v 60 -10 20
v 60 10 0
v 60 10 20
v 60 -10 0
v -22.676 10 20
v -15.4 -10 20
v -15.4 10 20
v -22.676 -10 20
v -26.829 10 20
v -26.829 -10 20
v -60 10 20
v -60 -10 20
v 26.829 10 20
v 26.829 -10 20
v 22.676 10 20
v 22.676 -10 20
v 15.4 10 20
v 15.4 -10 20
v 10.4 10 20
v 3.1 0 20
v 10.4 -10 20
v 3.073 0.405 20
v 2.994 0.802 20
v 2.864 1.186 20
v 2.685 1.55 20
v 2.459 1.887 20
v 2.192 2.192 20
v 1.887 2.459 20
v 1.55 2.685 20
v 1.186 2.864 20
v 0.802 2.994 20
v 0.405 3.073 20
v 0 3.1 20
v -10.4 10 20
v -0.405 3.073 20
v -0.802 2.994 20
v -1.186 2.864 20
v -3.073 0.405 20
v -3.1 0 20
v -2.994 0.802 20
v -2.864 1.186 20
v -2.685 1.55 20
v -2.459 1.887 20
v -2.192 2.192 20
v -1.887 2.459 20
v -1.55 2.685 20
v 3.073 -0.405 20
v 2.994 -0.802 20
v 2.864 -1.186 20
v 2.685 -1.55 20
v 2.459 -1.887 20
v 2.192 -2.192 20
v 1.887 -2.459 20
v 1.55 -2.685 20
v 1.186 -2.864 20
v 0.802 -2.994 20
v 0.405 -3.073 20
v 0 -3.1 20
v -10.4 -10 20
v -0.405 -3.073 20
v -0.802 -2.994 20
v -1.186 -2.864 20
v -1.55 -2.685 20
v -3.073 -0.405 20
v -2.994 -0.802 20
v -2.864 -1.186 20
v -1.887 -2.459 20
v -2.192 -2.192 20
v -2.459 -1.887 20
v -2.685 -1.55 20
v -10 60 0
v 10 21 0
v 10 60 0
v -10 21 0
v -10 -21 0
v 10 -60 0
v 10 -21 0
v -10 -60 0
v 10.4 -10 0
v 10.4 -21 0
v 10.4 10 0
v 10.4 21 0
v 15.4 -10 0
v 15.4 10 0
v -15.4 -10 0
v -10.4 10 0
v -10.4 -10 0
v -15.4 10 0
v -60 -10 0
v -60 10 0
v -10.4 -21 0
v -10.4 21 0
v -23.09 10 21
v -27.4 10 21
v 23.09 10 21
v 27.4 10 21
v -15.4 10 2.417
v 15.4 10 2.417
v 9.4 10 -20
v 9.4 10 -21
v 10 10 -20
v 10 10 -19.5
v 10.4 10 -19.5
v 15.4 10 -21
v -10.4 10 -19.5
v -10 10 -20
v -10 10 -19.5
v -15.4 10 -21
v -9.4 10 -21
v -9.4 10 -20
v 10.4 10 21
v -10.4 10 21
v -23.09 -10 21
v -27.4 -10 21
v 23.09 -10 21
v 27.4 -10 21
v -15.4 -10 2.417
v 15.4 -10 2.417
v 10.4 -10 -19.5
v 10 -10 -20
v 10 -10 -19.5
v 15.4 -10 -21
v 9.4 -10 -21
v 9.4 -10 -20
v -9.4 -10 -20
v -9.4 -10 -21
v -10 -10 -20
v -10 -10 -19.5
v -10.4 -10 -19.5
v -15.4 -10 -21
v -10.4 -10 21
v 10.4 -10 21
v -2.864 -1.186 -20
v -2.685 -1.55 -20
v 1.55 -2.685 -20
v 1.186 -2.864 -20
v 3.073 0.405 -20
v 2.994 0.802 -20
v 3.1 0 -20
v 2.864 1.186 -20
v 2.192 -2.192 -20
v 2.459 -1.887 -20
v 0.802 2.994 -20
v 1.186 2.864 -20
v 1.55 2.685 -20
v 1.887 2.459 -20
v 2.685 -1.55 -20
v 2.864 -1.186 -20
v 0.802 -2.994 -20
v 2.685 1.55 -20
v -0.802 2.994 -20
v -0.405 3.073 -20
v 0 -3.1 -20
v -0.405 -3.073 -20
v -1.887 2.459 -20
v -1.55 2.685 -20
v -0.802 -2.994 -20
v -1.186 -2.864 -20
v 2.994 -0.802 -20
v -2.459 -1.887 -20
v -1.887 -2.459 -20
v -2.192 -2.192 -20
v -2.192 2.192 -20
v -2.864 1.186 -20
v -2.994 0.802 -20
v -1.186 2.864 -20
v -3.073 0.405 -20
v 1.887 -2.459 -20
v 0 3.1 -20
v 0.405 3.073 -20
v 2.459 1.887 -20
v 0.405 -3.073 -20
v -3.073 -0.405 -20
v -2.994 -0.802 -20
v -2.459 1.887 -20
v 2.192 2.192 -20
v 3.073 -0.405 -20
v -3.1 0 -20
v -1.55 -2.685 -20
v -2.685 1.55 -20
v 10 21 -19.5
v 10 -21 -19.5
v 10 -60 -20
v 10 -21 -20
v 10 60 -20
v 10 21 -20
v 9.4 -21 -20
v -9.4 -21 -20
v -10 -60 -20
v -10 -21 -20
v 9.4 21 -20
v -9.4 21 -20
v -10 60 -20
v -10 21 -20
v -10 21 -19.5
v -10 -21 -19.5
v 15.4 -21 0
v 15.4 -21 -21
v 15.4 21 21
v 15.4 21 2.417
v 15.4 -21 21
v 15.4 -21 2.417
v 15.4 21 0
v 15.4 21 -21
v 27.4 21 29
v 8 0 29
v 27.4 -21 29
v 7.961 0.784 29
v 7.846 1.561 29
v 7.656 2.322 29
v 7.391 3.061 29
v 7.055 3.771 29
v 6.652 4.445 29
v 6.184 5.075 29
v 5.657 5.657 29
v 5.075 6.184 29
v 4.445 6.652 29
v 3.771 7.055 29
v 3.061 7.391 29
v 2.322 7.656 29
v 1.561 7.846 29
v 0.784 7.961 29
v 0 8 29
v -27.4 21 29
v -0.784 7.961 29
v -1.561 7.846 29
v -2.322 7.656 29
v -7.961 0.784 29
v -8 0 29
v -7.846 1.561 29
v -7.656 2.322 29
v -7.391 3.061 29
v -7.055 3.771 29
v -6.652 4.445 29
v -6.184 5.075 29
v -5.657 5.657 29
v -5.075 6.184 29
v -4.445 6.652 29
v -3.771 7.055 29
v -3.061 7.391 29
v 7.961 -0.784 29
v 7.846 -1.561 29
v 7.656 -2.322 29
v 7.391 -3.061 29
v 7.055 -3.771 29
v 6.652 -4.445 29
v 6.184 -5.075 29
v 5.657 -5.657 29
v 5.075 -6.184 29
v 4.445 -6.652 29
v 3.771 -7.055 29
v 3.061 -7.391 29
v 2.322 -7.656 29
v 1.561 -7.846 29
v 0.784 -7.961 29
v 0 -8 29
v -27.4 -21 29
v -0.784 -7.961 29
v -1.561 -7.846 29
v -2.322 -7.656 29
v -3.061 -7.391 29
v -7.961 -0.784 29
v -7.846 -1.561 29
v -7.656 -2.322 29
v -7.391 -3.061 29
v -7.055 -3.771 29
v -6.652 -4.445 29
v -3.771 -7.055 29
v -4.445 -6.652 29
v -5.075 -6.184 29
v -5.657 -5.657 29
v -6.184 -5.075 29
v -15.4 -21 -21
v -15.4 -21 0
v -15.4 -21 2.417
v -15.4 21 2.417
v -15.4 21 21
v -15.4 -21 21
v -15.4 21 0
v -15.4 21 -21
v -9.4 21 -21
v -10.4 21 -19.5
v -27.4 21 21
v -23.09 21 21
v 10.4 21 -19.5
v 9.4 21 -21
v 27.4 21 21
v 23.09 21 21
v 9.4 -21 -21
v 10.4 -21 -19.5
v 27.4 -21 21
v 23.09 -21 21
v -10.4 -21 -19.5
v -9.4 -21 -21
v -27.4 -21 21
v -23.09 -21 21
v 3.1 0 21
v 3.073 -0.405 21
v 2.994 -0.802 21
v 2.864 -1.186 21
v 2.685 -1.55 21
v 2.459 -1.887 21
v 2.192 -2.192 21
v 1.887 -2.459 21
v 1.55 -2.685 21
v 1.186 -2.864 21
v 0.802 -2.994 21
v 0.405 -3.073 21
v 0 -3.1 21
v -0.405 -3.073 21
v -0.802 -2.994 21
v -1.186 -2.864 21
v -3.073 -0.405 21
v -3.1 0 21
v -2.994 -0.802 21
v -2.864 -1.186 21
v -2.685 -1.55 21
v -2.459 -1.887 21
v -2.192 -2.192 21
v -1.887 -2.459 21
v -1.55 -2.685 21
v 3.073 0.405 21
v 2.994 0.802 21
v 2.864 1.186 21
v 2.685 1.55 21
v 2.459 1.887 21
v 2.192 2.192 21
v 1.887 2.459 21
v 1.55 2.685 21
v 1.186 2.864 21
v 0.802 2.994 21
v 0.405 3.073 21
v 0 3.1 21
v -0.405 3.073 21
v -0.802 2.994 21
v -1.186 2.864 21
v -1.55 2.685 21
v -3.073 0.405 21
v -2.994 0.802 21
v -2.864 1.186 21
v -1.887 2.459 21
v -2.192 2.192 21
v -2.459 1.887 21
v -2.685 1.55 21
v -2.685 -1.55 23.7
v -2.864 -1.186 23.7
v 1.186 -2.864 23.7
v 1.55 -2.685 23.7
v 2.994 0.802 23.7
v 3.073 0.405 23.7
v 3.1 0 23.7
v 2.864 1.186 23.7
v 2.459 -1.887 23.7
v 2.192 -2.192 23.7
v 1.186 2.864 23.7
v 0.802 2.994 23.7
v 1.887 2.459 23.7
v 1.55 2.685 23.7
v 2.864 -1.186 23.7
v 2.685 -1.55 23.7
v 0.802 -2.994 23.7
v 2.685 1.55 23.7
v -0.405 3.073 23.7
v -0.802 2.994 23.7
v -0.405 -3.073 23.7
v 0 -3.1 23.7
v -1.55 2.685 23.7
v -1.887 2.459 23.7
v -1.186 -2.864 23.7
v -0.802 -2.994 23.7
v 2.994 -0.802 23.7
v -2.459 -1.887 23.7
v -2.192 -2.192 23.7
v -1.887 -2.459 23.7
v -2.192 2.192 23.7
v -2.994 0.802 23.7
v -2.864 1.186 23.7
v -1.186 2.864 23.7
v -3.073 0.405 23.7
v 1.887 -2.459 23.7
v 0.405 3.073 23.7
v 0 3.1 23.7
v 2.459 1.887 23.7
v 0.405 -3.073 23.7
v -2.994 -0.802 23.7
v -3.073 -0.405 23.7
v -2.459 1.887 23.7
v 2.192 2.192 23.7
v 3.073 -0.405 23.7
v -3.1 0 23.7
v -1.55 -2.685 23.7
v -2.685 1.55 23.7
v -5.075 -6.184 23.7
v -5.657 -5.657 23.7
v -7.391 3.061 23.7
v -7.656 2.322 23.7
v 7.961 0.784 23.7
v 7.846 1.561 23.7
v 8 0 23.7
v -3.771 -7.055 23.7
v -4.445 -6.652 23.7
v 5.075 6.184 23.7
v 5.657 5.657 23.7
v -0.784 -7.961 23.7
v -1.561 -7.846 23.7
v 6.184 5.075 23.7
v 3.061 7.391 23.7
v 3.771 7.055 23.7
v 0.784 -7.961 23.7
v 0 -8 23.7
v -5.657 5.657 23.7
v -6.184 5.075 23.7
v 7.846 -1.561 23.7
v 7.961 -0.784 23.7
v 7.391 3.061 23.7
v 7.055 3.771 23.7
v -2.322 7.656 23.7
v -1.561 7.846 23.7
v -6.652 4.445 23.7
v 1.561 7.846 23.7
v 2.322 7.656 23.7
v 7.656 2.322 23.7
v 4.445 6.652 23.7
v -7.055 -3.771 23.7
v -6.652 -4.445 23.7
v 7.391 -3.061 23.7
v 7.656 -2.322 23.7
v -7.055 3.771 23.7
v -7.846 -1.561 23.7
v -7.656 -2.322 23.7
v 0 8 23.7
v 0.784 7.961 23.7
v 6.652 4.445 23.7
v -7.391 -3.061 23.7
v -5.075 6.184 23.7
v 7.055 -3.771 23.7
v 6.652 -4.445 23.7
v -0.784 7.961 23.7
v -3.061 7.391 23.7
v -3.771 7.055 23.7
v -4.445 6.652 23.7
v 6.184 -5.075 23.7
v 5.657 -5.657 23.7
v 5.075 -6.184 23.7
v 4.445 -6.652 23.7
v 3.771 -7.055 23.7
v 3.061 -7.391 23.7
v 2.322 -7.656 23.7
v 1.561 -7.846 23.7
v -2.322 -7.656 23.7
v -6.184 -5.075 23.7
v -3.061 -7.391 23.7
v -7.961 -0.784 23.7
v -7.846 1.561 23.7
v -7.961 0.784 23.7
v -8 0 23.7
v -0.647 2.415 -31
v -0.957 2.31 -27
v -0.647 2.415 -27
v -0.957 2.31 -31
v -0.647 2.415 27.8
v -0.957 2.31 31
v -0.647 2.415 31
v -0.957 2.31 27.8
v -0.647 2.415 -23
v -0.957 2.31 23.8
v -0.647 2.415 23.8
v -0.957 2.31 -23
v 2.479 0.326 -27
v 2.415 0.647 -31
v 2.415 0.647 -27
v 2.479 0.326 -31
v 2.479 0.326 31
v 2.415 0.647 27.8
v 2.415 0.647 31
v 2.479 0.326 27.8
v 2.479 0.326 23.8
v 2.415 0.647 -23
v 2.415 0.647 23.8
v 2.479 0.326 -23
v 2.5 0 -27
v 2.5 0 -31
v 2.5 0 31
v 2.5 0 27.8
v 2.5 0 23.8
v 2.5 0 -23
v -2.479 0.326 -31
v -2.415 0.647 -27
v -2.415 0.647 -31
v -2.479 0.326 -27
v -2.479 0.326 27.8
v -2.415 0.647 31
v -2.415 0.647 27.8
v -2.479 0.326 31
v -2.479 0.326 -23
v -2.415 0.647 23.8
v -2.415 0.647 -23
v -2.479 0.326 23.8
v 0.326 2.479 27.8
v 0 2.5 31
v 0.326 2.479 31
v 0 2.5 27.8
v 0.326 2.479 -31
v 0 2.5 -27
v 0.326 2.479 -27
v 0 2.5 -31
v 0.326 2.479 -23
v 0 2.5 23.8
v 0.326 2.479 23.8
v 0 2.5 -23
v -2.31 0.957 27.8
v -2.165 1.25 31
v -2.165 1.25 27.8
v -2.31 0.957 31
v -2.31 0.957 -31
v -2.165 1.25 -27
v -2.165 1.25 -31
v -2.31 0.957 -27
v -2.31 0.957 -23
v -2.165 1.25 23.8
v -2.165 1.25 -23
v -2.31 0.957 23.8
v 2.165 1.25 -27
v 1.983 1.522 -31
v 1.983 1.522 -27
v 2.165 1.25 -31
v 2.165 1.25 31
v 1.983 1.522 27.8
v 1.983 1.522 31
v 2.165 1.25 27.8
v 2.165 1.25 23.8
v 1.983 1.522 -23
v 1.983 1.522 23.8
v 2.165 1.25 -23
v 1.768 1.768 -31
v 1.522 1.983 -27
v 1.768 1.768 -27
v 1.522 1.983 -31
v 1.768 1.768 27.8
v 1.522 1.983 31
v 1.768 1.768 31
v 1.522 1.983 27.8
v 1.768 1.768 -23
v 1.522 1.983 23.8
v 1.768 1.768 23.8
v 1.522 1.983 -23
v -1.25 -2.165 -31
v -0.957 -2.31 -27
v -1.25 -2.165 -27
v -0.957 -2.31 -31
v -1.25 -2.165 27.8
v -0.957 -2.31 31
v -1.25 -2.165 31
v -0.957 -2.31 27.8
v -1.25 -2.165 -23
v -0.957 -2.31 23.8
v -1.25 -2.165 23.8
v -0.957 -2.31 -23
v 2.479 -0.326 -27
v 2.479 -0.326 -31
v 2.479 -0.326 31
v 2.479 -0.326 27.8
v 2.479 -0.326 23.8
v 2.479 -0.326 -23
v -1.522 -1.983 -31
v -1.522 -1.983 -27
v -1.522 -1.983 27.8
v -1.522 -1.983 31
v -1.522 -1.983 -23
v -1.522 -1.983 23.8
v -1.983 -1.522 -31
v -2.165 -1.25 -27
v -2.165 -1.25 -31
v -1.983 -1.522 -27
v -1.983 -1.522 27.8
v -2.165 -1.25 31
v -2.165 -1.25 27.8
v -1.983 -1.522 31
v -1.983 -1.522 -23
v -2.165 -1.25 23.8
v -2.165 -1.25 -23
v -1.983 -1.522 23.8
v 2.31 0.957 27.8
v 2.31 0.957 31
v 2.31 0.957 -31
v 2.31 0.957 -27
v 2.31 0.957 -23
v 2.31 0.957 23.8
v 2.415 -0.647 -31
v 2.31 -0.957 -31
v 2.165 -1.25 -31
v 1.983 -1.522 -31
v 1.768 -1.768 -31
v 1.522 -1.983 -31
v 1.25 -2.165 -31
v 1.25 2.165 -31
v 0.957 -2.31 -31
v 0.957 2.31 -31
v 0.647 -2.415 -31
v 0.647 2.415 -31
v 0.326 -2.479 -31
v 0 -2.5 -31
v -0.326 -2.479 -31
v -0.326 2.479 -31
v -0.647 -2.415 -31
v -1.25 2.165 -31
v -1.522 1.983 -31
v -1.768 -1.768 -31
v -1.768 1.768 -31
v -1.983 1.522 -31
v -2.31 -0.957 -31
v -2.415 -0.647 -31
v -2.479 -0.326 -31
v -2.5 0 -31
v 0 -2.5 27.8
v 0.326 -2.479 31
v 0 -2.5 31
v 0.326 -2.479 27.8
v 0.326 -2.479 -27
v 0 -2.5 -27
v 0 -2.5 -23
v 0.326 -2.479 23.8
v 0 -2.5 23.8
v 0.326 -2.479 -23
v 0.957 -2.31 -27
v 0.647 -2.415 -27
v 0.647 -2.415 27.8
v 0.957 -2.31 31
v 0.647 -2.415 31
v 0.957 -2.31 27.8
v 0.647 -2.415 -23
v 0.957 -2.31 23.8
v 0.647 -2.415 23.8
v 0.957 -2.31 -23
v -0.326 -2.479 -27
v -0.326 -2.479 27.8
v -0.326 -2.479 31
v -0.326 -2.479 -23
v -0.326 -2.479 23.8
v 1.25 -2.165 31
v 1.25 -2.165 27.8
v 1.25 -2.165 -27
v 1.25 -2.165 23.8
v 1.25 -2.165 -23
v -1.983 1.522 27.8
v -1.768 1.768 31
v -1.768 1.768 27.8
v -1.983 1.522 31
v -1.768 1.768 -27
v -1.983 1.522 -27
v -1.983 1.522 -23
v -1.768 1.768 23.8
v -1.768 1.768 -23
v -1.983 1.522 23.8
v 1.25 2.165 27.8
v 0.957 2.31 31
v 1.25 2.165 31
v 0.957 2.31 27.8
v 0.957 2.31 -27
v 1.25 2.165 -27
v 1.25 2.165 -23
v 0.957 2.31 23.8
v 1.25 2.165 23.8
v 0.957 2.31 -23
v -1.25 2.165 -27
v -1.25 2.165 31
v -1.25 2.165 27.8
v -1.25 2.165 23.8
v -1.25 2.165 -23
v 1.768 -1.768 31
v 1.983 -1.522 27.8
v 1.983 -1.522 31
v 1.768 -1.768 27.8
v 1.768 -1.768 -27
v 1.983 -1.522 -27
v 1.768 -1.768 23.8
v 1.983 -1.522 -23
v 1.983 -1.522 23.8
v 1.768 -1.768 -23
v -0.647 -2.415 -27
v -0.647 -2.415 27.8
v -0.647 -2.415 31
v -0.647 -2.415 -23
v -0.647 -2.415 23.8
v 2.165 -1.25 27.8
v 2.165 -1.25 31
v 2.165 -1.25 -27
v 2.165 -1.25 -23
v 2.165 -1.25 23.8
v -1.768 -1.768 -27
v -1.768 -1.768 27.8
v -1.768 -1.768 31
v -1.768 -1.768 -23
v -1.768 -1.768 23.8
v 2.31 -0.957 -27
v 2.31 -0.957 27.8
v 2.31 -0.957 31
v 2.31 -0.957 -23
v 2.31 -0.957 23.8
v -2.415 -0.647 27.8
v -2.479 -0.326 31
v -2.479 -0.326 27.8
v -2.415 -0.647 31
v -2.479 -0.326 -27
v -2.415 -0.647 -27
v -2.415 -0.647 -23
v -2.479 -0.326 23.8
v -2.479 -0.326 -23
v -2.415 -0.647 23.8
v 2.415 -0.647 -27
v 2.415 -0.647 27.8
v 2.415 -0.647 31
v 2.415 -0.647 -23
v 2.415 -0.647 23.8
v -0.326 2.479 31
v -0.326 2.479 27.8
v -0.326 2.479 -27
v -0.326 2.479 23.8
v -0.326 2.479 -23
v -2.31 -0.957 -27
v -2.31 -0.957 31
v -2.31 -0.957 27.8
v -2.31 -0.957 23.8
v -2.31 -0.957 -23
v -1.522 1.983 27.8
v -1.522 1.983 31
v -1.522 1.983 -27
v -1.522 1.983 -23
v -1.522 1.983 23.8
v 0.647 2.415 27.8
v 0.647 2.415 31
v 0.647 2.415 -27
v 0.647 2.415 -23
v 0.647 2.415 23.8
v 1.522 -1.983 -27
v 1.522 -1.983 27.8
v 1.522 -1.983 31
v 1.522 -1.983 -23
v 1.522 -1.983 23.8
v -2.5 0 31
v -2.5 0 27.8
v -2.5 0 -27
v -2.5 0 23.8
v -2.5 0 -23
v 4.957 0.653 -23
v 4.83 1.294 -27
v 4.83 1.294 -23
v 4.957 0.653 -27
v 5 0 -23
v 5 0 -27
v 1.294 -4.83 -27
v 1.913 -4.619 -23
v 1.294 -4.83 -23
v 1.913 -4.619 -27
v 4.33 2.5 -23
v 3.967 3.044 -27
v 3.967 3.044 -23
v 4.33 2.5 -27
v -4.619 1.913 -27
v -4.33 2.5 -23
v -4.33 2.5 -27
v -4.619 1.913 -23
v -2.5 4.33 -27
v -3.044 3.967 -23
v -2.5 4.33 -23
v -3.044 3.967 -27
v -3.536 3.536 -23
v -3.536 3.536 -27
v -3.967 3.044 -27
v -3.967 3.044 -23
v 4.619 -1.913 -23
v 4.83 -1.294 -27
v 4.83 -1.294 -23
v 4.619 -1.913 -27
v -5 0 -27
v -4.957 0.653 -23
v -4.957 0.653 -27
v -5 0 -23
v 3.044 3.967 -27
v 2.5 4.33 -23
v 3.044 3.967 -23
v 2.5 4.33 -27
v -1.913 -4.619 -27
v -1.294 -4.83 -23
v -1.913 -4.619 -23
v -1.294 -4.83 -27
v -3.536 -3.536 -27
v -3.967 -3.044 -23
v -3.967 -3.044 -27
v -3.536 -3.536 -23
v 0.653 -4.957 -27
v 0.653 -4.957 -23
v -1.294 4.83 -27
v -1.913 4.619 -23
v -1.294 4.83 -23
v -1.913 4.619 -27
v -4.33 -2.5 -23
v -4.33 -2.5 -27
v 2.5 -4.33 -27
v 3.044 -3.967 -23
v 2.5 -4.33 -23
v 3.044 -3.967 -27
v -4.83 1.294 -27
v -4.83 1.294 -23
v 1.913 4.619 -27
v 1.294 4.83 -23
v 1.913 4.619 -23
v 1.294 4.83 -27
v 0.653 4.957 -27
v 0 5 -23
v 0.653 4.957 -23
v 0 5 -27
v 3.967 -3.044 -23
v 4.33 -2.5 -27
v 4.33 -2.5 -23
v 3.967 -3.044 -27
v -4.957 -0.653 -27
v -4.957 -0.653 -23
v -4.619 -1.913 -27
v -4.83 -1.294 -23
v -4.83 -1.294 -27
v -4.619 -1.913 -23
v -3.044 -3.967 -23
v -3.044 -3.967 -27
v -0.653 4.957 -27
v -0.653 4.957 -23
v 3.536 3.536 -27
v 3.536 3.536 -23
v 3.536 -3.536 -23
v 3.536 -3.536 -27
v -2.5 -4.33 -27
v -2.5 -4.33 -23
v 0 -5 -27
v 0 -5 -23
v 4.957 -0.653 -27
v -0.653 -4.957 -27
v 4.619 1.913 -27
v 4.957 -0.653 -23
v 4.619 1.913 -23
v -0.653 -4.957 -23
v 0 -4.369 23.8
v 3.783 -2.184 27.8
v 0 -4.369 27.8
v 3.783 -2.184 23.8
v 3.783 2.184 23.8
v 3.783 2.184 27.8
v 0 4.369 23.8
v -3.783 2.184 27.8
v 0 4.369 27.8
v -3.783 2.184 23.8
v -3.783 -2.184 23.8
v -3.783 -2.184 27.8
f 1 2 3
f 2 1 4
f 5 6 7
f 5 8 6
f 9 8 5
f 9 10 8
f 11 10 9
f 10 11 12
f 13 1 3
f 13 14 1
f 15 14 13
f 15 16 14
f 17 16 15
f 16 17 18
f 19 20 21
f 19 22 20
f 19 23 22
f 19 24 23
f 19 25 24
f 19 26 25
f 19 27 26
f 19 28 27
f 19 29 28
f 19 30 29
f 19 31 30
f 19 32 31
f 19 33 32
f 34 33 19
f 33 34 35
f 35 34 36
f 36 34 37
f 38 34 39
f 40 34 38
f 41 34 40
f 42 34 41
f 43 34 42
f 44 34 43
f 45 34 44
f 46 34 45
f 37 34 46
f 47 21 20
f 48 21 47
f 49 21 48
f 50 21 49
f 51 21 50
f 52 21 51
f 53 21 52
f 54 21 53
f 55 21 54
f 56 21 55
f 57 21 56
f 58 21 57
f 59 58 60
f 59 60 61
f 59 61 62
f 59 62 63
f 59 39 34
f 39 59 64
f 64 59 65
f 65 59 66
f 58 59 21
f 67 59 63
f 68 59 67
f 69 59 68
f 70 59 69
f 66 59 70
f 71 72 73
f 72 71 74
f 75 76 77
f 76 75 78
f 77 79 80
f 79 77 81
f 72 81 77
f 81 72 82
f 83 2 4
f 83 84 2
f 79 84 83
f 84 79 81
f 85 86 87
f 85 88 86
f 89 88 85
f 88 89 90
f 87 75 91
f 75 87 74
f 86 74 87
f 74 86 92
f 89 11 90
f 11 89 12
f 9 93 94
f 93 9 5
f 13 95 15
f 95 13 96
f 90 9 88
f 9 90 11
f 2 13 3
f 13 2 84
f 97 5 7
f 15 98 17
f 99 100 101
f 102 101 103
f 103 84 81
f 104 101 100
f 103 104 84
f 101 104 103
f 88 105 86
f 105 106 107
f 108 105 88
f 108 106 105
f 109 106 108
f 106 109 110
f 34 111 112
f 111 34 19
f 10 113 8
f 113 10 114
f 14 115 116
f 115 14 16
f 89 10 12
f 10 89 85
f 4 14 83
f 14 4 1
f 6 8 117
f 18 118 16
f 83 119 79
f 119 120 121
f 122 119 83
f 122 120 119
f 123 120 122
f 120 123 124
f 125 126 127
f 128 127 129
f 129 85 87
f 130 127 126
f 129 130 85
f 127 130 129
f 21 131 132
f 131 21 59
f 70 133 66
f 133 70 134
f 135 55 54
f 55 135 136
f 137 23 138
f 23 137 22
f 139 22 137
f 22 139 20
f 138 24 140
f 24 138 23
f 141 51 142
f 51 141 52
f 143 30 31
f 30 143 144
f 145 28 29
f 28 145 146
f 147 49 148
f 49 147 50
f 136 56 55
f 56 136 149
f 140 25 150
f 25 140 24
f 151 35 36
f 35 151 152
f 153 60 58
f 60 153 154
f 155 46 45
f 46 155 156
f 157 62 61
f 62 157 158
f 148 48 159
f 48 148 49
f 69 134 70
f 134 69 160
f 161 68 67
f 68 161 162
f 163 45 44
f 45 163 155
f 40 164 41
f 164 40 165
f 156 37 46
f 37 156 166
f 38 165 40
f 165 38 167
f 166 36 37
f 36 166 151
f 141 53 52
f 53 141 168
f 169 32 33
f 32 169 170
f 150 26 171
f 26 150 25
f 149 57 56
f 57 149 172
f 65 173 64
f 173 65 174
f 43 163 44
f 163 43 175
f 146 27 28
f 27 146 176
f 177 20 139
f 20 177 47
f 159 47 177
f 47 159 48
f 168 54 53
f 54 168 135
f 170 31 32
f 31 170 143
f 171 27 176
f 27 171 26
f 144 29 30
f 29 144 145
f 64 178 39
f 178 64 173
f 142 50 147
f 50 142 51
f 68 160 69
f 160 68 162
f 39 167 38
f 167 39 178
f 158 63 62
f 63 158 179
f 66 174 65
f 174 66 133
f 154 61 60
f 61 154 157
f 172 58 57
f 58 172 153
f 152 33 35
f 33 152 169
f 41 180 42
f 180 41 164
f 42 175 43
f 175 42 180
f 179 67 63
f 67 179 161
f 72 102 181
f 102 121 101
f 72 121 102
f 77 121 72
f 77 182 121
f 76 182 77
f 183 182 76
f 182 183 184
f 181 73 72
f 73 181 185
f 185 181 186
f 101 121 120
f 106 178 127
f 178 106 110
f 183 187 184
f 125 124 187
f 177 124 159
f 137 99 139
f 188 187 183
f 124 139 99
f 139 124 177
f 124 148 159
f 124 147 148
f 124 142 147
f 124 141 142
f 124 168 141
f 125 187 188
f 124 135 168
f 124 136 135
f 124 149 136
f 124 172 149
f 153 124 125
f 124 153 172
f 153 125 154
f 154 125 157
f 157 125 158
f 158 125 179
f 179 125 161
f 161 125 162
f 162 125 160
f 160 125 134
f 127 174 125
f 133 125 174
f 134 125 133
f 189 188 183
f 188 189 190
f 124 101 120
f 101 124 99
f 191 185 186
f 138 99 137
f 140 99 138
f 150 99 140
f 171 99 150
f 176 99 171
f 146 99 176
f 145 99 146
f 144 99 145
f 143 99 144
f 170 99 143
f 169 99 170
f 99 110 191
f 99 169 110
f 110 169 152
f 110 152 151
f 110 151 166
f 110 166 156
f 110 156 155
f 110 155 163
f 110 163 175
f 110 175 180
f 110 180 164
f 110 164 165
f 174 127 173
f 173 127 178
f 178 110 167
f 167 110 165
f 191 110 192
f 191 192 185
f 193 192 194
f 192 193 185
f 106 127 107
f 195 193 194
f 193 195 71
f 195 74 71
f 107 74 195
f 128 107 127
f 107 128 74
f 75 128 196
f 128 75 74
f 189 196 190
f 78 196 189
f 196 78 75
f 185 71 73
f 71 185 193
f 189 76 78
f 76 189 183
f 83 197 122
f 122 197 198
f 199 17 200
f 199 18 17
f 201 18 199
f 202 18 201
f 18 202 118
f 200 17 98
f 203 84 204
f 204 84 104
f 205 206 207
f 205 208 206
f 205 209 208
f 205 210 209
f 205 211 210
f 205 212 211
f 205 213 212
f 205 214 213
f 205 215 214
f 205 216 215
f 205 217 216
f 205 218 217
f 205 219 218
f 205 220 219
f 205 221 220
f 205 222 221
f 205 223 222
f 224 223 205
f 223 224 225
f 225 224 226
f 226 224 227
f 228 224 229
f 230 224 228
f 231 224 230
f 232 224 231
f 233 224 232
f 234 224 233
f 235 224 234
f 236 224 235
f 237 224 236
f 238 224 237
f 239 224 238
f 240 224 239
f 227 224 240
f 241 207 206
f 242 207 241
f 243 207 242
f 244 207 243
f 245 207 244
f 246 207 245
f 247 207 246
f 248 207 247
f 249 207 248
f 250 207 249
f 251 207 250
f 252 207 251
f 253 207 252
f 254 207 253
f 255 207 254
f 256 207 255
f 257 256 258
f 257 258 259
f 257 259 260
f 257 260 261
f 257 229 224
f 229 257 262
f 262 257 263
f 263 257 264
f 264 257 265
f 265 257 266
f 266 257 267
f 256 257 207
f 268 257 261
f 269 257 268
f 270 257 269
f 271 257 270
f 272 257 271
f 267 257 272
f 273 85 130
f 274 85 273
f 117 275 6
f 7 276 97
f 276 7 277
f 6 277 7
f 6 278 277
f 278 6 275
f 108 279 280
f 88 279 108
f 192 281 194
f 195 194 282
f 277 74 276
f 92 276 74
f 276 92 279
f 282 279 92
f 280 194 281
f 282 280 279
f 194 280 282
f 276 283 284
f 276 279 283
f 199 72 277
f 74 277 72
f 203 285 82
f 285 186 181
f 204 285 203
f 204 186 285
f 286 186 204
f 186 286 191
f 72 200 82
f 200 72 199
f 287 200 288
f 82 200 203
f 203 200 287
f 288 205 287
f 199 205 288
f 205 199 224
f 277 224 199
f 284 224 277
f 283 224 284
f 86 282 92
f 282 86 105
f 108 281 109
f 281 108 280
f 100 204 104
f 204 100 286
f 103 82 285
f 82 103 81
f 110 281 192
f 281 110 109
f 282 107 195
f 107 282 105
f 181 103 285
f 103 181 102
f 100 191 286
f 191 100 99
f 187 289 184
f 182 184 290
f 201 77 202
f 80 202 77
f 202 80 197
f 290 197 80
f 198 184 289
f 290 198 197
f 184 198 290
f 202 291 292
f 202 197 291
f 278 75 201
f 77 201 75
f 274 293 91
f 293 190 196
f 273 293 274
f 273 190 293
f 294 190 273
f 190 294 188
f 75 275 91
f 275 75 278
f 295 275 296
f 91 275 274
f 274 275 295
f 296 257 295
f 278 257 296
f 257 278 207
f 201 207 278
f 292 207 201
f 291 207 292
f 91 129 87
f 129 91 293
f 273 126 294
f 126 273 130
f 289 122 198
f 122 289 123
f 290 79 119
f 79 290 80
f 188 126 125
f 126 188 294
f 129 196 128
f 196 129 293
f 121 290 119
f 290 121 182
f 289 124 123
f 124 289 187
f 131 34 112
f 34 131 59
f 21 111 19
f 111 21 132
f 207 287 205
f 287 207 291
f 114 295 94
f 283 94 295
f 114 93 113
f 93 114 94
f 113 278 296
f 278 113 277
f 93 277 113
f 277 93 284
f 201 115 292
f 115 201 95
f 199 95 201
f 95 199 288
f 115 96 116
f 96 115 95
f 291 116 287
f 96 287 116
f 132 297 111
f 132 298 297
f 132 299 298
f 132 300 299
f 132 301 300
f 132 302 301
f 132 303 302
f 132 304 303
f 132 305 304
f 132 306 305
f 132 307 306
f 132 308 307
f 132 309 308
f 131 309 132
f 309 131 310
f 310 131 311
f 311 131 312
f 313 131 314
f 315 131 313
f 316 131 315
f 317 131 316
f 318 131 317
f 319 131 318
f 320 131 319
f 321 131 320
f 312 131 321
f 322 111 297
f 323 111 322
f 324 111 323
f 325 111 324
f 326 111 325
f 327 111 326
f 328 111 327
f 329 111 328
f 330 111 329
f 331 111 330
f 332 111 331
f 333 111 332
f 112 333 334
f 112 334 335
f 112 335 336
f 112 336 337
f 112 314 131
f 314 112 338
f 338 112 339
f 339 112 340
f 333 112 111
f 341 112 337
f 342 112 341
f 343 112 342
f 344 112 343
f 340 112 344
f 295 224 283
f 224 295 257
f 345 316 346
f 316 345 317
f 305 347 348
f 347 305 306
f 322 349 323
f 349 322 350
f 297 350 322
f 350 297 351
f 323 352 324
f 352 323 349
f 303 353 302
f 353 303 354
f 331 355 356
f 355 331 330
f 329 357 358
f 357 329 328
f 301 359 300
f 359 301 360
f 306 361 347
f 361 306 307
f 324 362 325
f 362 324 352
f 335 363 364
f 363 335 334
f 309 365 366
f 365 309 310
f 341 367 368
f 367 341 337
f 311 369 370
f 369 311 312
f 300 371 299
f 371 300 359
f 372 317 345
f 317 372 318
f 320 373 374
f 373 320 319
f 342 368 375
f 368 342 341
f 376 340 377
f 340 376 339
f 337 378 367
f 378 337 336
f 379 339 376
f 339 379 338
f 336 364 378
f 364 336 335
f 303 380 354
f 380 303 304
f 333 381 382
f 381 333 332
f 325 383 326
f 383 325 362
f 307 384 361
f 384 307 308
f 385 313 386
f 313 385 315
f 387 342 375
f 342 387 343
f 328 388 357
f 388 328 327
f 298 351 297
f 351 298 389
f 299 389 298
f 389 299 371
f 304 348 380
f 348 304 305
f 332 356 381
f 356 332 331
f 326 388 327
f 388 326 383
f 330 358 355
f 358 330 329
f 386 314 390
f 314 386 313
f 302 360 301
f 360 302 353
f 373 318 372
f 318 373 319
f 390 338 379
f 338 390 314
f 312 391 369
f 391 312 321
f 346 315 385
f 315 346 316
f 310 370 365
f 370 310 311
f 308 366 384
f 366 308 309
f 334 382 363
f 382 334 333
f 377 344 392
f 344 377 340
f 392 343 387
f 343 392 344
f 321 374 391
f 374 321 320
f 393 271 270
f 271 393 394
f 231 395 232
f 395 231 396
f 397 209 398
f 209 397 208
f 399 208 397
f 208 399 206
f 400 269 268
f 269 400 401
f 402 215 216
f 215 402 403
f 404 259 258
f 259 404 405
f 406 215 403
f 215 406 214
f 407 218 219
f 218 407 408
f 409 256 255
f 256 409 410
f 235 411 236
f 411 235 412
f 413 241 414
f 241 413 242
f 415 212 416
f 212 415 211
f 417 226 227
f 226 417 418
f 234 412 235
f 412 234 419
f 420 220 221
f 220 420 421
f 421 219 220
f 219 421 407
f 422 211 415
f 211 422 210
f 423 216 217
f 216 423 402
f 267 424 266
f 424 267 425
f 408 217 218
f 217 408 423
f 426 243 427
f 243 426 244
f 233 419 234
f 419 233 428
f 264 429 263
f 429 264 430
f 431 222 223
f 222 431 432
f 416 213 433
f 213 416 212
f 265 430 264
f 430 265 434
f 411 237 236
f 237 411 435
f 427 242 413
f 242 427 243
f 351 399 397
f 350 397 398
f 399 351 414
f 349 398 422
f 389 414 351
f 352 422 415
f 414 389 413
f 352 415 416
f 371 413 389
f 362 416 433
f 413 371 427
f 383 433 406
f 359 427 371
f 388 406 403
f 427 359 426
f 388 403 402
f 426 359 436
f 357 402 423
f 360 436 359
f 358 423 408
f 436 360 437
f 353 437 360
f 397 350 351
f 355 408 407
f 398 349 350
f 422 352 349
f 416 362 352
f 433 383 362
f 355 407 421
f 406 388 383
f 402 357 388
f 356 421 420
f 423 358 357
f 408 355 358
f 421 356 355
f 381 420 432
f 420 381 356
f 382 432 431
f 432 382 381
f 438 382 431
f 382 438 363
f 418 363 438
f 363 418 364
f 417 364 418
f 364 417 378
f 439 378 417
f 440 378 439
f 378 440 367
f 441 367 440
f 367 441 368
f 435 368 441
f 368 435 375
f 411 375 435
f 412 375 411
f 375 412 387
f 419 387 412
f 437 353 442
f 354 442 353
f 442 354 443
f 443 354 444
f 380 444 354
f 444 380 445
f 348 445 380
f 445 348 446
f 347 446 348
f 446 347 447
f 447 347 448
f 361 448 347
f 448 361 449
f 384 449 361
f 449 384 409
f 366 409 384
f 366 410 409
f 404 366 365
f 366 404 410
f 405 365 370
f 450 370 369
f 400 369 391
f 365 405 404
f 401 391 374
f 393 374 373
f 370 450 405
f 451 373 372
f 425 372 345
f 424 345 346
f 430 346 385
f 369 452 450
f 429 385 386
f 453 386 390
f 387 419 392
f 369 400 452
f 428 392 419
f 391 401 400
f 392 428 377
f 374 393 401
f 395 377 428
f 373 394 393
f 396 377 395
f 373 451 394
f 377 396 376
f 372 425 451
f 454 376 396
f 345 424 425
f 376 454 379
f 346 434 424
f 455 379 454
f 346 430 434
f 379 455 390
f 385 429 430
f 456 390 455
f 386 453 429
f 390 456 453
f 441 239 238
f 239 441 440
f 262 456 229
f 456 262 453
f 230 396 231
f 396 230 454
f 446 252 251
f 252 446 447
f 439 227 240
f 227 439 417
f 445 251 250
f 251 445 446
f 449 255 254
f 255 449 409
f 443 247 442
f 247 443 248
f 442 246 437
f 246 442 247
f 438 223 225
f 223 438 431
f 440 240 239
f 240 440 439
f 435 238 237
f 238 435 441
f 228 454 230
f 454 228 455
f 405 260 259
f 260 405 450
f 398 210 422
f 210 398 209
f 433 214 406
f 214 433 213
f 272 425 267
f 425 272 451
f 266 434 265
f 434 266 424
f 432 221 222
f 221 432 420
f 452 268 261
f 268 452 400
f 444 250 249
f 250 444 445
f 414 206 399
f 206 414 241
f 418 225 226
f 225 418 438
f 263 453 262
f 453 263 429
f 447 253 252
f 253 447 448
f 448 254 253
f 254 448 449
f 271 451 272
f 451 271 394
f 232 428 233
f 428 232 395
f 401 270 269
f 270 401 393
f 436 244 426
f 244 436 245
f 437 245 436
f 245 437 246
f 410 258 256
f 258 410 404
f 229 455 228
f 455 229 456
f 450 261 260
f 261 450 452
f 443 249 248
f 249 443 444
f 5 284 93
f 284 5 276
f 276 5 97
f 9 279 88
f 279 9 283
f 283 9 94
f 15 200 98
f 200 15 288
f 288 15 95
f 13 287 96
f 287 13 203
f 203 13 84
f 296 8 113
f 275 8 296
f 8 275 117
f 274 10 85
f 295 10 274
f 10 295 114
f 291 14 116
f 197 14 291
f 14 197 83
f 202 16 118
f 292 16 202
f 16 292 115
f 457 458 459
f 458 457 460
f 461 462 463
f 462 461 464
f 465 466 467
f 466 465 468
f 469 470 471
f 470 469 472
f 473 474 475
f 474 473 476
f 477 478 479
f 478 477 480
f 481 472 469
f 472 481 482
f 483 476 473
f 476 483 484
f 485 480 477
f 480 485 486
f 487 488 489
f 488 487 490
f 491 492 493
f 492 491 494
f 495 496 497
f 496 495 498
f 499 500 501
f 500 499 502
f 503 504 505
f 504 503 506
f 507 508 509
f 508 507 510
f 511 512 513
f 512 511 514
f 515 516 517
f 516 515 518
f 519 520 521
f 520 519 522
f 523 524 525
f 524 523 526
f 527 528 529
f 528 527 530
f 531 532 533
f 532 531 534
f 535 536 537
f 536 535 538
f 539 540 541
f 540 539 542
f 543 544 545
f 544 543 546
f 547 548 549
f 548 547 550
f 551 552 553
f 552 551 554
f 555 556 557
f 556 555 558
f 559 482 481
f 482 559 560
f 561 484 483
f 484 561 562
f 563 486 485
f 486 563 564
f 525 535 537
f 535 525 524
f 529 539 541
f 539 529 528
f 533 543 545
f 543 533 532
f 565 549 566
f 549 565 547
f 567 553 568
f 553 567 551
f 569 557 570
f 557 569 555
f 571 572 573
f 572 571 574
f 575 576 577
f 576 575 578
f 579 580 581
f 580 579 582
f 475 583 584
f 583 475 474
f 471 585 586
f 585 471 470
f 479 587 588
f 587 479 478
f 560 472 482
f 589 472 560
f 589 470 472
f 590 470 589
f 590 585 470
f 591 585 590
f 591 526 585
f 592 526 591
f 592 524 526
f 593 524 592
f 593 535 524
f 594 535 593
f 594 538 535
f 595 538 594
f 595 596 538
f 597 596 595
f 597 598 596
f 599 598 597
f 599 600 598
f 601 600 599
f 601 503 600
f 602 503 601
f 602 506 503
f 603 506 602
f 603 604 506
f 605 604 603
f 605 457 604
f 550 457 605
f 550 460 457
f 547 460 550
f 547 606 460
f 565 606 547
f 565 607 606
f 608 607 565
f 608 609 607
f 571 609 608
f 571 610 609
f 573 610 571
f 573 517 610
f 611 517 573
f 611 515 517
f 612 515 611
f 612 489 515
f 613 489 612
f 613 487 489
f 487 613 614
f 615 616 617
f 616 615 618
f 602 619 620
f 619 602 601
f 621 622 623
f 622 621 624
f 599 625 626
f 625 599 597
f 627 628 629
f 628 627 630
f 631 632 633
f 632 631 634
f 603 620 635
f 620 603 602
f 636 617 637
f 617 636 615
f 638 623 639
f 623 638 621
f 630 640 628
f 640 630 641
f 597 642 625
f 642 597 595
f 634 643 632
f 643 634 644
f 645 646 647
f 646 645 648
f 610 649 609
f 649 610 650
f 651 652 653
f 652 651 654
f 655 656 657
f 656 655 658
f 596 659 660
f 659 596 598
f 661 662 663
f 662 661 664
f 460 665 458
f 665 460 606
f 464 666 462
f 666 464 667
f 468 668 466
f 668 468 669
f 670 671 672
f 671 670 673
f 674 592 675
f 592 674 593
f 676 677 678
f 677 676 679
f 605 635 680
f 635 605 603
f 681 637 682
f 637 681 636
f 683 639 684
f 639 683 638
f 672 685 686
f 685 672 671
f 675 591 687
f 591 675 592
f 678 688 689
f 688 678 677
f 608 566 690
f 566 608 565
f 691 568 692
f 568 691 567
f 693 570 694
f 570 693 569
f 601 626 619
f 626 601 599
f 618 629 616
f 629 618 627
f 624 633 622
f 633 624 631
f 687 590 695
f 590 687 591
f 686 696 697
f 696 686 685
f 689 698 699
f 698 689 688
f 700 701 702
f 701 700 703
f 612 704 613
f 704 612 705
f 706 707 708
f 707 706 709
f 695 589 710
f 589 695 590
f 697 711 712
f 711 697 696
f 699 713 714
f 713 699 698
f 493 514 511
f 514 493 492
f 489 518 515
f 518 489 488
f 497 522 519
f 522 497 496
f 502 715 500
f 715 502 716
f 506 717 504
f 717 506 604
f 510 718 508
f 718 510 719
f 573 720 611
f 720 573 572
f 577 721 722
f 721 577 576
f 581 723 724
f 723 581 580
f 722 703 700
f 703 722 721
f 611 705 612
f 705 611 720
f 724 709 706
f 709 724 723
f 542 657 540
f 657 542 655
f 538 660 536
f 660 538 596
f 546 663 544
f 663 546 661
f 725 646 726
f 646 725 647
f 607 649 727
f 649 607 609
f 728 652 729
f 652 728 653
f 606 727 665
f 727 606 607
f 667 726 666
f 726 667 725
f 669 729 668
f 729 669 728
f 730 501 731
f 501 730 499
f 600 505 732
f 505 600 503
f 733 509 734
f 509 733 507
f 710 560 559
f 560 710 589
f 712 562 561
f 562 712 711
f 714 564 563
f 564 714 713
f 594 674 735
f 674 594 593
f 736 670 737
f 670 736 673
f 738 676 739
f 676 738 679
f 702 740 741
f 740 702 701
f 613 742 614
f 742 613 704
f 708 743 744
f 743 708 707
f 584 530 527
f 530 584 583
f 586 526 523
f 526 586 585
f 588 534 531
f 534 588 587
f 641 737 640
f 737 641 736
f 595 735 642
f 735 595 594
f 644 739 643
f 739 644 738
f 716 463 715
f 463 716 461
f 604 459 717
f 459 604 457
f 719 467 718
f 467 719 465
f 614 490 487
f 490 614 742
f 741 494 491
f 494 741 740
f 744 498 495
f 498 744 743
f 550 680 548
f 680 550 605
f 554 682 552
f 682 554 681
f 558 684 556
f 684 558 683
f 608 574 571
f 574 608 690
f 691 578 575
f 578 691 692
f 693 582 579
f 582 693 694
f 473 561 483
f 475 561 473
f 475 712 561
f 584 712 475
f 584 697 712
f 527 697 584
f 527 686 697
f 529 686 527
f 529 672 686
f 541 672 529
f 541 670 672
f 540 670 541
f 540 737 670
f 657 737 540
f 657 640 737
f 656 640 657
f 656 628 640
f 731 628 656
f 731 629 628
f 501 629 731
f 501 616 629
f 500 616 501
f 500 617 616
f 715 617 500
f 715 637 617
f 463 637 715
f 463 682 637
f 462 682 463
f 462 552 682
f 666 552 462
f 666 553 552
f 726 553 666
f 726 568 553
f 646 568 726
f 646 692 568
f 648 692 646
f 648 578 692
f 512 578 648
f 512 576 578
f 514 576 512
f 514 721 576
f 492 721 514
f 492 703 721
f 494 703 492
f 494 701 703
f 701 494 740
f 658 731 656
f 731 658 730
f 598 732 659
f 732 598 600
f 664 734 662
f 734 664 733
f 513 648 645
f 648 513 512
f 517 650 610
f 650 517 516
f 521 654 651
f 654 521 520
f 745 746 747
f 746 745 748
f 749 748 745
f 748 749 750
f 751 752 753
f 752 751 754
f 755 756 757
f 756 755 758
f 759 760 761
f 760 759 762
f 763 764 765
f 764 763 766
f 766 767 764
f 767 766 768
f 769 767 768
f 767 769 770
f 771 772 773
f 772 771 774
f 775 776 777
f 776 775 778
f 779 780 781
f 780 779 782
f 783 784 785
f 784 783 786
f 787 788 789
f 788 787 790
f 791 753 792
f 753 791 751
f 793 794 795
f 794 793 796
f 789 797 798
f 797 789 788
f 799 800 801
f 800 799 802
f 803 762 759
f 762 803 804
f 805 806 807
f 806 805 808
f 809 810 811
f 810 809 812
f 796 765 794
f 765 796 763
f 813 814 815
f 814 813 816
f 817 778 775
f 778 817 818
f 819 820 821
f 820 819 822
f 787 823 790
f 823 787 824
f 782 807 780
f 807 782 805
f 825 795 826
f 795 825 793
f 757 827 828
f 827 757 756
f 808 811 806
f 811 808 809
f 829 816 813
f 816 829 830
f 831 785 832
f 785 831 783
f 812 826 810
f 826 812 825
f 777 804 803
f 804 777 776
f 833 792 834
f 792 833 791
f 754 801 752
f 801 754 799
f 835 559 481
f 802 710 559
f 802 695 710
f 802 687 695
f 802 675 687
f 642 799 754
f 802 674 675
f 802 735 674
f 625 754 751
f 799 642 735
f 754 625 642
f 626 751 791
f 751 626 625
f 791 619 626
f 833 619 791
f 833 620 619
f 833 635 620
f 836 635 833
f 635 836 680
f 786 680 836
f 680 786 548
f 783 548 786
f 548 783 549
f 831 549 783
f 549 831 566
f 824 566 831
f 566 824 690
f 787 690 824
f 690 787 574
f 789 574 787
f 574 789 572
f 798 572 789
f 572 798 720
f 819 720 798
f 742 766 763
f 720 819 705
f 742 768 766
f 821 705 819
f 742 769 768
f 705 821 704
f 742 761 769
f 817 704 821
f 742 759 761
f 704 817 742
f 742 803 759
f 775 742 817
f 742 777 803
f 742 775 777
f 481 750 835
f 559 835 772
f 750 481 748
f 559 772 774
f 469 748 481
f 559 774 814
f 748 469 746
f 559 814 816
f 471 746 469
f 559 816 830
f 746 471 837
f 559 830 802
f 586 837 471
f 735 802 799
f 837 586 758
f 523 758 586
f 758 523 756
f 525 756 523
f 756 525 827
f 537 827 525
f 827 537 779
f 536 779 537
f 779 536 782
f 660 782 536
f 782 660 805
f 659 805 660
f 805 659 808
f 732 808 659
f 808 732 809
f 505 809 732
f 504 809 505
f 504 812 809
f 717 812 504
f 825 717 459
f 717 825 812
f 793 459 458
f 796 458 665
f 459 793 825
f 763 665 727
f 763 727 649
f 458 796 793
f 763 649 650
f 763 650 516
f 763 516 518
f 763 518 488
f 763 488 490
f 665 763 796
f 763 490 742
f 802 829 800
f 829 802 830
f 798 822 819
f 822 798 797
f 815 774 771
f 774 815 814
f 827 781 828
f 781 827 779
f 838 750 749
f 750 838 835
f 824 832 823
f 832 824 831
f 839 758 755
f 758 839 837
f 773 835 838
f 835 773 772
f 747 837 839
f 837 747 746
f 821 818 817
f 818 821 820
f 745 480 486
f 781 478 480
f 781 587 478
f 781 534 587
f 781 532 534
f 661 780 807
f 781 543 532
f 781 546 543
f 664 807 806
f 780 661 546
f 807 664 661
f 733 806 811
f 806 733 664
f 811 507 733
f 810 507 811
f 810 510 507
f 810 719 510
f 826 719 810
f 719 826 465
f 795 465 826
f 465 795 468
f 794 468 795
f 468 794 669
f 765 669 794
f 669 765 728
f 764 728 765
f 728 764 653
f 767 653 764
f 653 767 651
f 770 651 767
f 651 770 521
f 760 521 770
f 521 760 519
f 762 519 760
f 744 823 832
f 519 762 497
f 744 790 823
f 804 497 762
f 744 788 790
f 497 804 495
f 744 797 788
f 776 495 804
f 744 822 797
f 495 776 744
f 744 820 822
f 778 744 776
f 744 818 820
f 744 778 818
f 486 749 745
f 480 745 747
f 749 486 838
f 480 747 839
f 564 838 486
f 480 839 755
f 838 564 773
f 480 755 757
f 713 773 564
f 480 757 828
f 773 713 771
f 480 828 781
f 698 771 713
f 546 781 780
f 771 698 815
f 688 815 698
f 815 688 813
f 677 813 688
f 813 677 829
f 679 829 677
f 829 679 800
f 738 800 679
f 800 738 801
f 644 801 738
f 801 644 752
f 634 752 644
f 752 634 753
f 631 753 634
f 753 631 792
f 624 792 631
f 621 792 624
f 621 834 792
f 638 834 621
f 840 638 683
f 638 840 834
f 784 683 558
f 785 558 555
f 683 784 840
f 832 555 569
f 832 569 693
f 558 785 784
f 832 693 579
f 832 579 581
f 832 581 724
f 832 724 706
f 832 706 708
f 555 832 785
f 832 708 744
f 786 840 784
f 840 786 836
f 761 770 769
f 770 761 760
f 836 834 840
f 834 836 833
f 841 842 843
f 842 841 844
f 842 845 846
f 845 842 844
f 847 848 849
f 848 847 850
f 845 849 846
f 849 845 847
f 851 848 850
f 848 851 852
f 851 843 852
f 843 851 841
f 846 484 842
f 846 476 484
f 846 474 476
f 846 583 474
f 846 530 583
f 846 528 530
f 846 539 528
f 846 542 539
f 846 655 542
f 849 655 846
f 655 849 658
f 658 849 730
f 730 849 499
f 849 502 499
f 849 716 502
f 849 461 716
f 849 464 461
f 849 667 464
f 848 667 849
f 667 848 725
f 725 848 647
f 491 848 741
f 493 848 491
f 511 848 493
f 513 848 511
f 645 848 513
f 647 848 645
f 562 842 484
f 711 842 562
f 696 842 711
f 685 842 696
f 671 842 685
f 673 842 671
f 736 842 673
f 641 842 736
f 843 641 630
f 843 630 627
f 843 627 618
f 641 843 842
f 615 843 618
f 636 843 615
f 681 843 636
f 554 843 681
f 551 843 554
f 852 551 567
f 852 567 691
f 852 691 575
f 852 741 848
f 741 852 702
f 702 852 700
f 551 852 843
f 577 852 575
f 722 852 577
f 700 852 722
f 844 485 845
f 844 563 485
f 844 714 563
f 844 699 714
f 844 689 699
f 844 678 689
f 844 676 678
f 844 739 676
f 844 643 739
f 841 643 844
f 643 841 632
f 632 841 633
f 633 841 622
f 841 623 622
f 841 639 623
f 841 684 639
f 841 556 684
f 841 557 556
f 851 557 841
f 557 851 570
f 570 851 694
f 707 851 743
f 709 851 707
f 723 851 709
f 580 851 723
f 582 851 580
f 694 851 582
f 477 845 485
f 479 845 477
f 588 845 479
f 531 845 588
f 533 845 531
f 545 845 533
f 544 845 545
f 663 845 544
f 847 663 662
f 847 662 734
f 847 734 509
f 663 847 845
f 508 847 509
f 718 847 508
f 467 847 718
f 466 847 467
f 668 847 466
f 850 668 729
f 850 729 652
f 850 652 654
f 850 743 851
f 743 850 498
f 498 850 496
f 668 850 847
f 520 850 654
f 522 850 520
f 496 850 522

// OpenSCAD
// Candidate v1.1: four full-depth solid corner walls.
//
// Base: accepted v0.7 eaves12 geometry.  v0.9 and v1.0 are not imported.
// The four XZ corner solids occupy the full front/back U-plate depths:
//   +Y FRONT: y=+10..+21
//   -Y BACK:  y=-21..-10
// The central y=-10..+10 passage remains open.

use <../perpendicular-u-joint-guard-v0.7/perpendicular_double_u_guard.scad>;

$fn = 48;
PART = "candidate_iso";

// Explicit v0.7 interface values.  `use` imports modules, not top-level vars.
roof_x_outer = 27.4;       // accepted eaves12 roof: -27.4..+27.4
side_wall_x_outer = 15.4;  // existing side-wall outer edge
side_wall_x_inner = 10.4;  // existing side-wall inner edge
plate_y_inner = 10.0;
plate_y_outer = 21.0;
plate_depth_y = plate_y_outer - plate_y_inner; // 11 mm full U-plate depth
material_thickness = 5.0;  // existing X side-wall thickness
roof_z_bottom = 21.0;
roof_z_top = 29.0;
landing_z = 0.0;           // blue lower tube top / side-wall lower target
roof_overlap_x = 1.0;
side_overlap_x = 1.0;

front_wall_y0 = plate_y_inner;
front_wall_y1 = plate_y_outer;
back_wall_y0 = -plate_y_outer;
back_wall_y1 = -plate_y_inner;

assert(plate_depth_y == 11, "前后 U 板完整深度必须是 11 mm");
assert(landing_z == 0,
       "蓝色下方方管上表面及侧墙目标高度必须是 z=0");
assert(roof_overlap_x > 0 && side_overlap_x > 0,
       "四面墙必须与屋檐和侧墙都有正重叠");
assert(front_wall_y0 == 10 && front_wall_y1 == 21,
       "前侧整段包角墙必须覆盖 y=+10..+21");
assert(back_wall_y0 == -21 && back_wall_y1 == -10,
       "后侧整段包角墙必须覆盖 y=-21..-10");

// The XZ trapezoid covers the complete corner volume between the roof end
// and the side-wall interface.  It has a finite roof overlap (1 mm) and a
// finite side-wall overlap (1 mm), so it is not an edge-tangent rib.
module sloped_wall_xz(points, yc) {
    translate([0, yc, 0])
        rotate([90, 0, 0])
            linear_extrude(height = plate_depth_y,
                           center = true,
                           convexity = 10)
                polygon(points = points);
}

module wall_front_neg_x() {
    sloped_wall_xz([
        [-roof_x_outer, roof_z_bottom],
        [-roof_x_outer, roof_z_top],
        [-roof_x_outer + roof_overlap_x, roof_z_top],
        [-side_wall_x_outer + side_overlap_x, landing_z],
        [-side_wall_x_outer, landing_z]
    ], (front_wall_y0 + front_wall_y1) / 2);
}

module wall_front_pos_x() {
    sloped_wall_xz([
        [roof_x_outer, roof_z_bottom],
        [roof_x_outer, roof_z_top],
        [roof_x_outer - roof_overlap_x, roof_z_top],
        [side_wall_x_outer - side_overlap_x, landing_z],
        [side_wall_x_outer, landing_z]
    ], (front_wall_y0 + front_wall_y1) / 2);
}

module wall_back_neg_x() {
    sloped_wall_xz([
        [-roof_x_outer, roof_z_bottom],
        [-roof_x_outer, roof_z_top],
        [-roof_x_outer + roof_overlap_x, roof_z_top],
        [-side_wall_x_outer + side_overlap_x, landing_z],
        [-side_wall_x_outer, landing_z]
    ], (back_wall_y0 + back_wall_y1) / 2);
}

module wall_back_pos_x() {
    sloped_wall_xz([
        [roof_x_outer, roof_z_bottom],
        [roof_x_outer, roof_z_top],
        [roof_x_outer - roof_overlap_x, roof_z_top],
        [side_wall_x_outer - side_overlap_x, landing_z],
        [side_wall_x_outer, landing_z]
    ], (back_wall_y0 + back_wall_y1) / 2);
}

module front_two_full_corner_walls() {
    union() {
        wall_front_neg_x();
        wall_front_pos_x();
    }
}

module back_two_full_corner_walls() {
    union() {
        wall_back_neg_x();
        wall_back_pos_x();
    }
}

module all_four_full_corner_walls() {
    union() {
        front_two_full_corner_walls();
        back_two_full_corner_walls();
    }
}

module candidate_print_solid() {
    // The through-hole is intentionally applied after the complete union.
    // This keeps the screw clearance unambiguously open from the bottom to
    // the top, while preserving the round nut pocket from the v0.7 base.
    difference() {
        union() {
            double_u_clip();
            all_four_full_corner_walls();
        }
        vertical_screw_relief();
    }
}

module candidate_clip() {
    candidate_print_solid();
}

module candidate_assembly_iso() {
    upper_long_tube();
    lower_cross_tube();
    color([0.96, 0.39, 0.08]) double_u_clip();
    color([0.86, 0.13, 0.08]) front_two_full_corner_walls();
    color([0.62, 0.12, 0.52]) back_two_full_corner_walls();
    vertical_joint_screw();
}

module candidate_front_xz() {
    lower_cross_tube();
    color([0.96, 0.39, 0.08]) double_u_clip();
    color([0.86, 0.13, 0.08]) front_two_full_corner_walls();
    vertical_joint_screw();
}

module candidate_back_xz() {
    lower_cross_tube();
    color([0.96, 0.39, 0.08]) double_u_clip();
    color([0.62, 0.12, 0.52]) back_two_full_corner_walls();
    vertical_joint_screw();
}

module candidate_top_slice() {
    // Review slice z=-0.5..2.5: it includes the blue tube's top and the
    // printable corner walls, exposing the full y bands and the open 20 mm
    // central passage.
    slice_box = 200;
    color([0.28, 0.45, 0.78])
        intersection() {
            lower_cross_tube();
            translate([-slice_box / 2, -slice_box / 2, -0.5])
                cube([slice_box, slice_box, 3.0]);
        }
    color([0.96, 0.39, 0.08])
        intersection() {
            double_u_clip();
            translate([-slice_box / 2, -slice_box / 2, -0.5])
                cube([slice_box, slice_box, 3.0]);
        }
    color([0.86, 0.13, 0.08])
        intersection() {
            front_two_full_corner_walls();
            translate([-slice_box / 2, -slice_box / 2, -0.5])
                cube([slice_box, slice_box, 3.0]);
        }
    color([0.62, 0.12, 0.52])
        intersection() {
            back_two_full_corner_walls();
            translate([-slice_box / 2, -slice_box / 2, -0.5])
                cube([slice_box, slice_box, 3.0]);
        }
}

module candidate_hole_section() {
    // Thin y=0 centre section of the printable body.  The final difference
    // leaves the complete z-axis hole and round top pocket visible; the
    // opening below the roof is intentionally visible because the central
    // y=-10..+10 passage is not filled by the front/back corner walls.
    intersection() {
        candidate_print_solid();
        translate([-100, -0.4, -100]) cube([200, 0.8, 200]);
    }
}

if (PART == "candidate_clip") {
    candidate_clip();
} else if (PART == "candidate_front_xz") {
    candidate_front_xz();
} else if (PART == "candidate_back_xz") {
    candidate_back_xz();
} else if (PART == "candidate_top_slice") {
    candidate_top_slice();
} else if (PART == "candidate_hole_section") {
    candidate_hole_section();
} else {
    candidate_assembly_iso();
}
